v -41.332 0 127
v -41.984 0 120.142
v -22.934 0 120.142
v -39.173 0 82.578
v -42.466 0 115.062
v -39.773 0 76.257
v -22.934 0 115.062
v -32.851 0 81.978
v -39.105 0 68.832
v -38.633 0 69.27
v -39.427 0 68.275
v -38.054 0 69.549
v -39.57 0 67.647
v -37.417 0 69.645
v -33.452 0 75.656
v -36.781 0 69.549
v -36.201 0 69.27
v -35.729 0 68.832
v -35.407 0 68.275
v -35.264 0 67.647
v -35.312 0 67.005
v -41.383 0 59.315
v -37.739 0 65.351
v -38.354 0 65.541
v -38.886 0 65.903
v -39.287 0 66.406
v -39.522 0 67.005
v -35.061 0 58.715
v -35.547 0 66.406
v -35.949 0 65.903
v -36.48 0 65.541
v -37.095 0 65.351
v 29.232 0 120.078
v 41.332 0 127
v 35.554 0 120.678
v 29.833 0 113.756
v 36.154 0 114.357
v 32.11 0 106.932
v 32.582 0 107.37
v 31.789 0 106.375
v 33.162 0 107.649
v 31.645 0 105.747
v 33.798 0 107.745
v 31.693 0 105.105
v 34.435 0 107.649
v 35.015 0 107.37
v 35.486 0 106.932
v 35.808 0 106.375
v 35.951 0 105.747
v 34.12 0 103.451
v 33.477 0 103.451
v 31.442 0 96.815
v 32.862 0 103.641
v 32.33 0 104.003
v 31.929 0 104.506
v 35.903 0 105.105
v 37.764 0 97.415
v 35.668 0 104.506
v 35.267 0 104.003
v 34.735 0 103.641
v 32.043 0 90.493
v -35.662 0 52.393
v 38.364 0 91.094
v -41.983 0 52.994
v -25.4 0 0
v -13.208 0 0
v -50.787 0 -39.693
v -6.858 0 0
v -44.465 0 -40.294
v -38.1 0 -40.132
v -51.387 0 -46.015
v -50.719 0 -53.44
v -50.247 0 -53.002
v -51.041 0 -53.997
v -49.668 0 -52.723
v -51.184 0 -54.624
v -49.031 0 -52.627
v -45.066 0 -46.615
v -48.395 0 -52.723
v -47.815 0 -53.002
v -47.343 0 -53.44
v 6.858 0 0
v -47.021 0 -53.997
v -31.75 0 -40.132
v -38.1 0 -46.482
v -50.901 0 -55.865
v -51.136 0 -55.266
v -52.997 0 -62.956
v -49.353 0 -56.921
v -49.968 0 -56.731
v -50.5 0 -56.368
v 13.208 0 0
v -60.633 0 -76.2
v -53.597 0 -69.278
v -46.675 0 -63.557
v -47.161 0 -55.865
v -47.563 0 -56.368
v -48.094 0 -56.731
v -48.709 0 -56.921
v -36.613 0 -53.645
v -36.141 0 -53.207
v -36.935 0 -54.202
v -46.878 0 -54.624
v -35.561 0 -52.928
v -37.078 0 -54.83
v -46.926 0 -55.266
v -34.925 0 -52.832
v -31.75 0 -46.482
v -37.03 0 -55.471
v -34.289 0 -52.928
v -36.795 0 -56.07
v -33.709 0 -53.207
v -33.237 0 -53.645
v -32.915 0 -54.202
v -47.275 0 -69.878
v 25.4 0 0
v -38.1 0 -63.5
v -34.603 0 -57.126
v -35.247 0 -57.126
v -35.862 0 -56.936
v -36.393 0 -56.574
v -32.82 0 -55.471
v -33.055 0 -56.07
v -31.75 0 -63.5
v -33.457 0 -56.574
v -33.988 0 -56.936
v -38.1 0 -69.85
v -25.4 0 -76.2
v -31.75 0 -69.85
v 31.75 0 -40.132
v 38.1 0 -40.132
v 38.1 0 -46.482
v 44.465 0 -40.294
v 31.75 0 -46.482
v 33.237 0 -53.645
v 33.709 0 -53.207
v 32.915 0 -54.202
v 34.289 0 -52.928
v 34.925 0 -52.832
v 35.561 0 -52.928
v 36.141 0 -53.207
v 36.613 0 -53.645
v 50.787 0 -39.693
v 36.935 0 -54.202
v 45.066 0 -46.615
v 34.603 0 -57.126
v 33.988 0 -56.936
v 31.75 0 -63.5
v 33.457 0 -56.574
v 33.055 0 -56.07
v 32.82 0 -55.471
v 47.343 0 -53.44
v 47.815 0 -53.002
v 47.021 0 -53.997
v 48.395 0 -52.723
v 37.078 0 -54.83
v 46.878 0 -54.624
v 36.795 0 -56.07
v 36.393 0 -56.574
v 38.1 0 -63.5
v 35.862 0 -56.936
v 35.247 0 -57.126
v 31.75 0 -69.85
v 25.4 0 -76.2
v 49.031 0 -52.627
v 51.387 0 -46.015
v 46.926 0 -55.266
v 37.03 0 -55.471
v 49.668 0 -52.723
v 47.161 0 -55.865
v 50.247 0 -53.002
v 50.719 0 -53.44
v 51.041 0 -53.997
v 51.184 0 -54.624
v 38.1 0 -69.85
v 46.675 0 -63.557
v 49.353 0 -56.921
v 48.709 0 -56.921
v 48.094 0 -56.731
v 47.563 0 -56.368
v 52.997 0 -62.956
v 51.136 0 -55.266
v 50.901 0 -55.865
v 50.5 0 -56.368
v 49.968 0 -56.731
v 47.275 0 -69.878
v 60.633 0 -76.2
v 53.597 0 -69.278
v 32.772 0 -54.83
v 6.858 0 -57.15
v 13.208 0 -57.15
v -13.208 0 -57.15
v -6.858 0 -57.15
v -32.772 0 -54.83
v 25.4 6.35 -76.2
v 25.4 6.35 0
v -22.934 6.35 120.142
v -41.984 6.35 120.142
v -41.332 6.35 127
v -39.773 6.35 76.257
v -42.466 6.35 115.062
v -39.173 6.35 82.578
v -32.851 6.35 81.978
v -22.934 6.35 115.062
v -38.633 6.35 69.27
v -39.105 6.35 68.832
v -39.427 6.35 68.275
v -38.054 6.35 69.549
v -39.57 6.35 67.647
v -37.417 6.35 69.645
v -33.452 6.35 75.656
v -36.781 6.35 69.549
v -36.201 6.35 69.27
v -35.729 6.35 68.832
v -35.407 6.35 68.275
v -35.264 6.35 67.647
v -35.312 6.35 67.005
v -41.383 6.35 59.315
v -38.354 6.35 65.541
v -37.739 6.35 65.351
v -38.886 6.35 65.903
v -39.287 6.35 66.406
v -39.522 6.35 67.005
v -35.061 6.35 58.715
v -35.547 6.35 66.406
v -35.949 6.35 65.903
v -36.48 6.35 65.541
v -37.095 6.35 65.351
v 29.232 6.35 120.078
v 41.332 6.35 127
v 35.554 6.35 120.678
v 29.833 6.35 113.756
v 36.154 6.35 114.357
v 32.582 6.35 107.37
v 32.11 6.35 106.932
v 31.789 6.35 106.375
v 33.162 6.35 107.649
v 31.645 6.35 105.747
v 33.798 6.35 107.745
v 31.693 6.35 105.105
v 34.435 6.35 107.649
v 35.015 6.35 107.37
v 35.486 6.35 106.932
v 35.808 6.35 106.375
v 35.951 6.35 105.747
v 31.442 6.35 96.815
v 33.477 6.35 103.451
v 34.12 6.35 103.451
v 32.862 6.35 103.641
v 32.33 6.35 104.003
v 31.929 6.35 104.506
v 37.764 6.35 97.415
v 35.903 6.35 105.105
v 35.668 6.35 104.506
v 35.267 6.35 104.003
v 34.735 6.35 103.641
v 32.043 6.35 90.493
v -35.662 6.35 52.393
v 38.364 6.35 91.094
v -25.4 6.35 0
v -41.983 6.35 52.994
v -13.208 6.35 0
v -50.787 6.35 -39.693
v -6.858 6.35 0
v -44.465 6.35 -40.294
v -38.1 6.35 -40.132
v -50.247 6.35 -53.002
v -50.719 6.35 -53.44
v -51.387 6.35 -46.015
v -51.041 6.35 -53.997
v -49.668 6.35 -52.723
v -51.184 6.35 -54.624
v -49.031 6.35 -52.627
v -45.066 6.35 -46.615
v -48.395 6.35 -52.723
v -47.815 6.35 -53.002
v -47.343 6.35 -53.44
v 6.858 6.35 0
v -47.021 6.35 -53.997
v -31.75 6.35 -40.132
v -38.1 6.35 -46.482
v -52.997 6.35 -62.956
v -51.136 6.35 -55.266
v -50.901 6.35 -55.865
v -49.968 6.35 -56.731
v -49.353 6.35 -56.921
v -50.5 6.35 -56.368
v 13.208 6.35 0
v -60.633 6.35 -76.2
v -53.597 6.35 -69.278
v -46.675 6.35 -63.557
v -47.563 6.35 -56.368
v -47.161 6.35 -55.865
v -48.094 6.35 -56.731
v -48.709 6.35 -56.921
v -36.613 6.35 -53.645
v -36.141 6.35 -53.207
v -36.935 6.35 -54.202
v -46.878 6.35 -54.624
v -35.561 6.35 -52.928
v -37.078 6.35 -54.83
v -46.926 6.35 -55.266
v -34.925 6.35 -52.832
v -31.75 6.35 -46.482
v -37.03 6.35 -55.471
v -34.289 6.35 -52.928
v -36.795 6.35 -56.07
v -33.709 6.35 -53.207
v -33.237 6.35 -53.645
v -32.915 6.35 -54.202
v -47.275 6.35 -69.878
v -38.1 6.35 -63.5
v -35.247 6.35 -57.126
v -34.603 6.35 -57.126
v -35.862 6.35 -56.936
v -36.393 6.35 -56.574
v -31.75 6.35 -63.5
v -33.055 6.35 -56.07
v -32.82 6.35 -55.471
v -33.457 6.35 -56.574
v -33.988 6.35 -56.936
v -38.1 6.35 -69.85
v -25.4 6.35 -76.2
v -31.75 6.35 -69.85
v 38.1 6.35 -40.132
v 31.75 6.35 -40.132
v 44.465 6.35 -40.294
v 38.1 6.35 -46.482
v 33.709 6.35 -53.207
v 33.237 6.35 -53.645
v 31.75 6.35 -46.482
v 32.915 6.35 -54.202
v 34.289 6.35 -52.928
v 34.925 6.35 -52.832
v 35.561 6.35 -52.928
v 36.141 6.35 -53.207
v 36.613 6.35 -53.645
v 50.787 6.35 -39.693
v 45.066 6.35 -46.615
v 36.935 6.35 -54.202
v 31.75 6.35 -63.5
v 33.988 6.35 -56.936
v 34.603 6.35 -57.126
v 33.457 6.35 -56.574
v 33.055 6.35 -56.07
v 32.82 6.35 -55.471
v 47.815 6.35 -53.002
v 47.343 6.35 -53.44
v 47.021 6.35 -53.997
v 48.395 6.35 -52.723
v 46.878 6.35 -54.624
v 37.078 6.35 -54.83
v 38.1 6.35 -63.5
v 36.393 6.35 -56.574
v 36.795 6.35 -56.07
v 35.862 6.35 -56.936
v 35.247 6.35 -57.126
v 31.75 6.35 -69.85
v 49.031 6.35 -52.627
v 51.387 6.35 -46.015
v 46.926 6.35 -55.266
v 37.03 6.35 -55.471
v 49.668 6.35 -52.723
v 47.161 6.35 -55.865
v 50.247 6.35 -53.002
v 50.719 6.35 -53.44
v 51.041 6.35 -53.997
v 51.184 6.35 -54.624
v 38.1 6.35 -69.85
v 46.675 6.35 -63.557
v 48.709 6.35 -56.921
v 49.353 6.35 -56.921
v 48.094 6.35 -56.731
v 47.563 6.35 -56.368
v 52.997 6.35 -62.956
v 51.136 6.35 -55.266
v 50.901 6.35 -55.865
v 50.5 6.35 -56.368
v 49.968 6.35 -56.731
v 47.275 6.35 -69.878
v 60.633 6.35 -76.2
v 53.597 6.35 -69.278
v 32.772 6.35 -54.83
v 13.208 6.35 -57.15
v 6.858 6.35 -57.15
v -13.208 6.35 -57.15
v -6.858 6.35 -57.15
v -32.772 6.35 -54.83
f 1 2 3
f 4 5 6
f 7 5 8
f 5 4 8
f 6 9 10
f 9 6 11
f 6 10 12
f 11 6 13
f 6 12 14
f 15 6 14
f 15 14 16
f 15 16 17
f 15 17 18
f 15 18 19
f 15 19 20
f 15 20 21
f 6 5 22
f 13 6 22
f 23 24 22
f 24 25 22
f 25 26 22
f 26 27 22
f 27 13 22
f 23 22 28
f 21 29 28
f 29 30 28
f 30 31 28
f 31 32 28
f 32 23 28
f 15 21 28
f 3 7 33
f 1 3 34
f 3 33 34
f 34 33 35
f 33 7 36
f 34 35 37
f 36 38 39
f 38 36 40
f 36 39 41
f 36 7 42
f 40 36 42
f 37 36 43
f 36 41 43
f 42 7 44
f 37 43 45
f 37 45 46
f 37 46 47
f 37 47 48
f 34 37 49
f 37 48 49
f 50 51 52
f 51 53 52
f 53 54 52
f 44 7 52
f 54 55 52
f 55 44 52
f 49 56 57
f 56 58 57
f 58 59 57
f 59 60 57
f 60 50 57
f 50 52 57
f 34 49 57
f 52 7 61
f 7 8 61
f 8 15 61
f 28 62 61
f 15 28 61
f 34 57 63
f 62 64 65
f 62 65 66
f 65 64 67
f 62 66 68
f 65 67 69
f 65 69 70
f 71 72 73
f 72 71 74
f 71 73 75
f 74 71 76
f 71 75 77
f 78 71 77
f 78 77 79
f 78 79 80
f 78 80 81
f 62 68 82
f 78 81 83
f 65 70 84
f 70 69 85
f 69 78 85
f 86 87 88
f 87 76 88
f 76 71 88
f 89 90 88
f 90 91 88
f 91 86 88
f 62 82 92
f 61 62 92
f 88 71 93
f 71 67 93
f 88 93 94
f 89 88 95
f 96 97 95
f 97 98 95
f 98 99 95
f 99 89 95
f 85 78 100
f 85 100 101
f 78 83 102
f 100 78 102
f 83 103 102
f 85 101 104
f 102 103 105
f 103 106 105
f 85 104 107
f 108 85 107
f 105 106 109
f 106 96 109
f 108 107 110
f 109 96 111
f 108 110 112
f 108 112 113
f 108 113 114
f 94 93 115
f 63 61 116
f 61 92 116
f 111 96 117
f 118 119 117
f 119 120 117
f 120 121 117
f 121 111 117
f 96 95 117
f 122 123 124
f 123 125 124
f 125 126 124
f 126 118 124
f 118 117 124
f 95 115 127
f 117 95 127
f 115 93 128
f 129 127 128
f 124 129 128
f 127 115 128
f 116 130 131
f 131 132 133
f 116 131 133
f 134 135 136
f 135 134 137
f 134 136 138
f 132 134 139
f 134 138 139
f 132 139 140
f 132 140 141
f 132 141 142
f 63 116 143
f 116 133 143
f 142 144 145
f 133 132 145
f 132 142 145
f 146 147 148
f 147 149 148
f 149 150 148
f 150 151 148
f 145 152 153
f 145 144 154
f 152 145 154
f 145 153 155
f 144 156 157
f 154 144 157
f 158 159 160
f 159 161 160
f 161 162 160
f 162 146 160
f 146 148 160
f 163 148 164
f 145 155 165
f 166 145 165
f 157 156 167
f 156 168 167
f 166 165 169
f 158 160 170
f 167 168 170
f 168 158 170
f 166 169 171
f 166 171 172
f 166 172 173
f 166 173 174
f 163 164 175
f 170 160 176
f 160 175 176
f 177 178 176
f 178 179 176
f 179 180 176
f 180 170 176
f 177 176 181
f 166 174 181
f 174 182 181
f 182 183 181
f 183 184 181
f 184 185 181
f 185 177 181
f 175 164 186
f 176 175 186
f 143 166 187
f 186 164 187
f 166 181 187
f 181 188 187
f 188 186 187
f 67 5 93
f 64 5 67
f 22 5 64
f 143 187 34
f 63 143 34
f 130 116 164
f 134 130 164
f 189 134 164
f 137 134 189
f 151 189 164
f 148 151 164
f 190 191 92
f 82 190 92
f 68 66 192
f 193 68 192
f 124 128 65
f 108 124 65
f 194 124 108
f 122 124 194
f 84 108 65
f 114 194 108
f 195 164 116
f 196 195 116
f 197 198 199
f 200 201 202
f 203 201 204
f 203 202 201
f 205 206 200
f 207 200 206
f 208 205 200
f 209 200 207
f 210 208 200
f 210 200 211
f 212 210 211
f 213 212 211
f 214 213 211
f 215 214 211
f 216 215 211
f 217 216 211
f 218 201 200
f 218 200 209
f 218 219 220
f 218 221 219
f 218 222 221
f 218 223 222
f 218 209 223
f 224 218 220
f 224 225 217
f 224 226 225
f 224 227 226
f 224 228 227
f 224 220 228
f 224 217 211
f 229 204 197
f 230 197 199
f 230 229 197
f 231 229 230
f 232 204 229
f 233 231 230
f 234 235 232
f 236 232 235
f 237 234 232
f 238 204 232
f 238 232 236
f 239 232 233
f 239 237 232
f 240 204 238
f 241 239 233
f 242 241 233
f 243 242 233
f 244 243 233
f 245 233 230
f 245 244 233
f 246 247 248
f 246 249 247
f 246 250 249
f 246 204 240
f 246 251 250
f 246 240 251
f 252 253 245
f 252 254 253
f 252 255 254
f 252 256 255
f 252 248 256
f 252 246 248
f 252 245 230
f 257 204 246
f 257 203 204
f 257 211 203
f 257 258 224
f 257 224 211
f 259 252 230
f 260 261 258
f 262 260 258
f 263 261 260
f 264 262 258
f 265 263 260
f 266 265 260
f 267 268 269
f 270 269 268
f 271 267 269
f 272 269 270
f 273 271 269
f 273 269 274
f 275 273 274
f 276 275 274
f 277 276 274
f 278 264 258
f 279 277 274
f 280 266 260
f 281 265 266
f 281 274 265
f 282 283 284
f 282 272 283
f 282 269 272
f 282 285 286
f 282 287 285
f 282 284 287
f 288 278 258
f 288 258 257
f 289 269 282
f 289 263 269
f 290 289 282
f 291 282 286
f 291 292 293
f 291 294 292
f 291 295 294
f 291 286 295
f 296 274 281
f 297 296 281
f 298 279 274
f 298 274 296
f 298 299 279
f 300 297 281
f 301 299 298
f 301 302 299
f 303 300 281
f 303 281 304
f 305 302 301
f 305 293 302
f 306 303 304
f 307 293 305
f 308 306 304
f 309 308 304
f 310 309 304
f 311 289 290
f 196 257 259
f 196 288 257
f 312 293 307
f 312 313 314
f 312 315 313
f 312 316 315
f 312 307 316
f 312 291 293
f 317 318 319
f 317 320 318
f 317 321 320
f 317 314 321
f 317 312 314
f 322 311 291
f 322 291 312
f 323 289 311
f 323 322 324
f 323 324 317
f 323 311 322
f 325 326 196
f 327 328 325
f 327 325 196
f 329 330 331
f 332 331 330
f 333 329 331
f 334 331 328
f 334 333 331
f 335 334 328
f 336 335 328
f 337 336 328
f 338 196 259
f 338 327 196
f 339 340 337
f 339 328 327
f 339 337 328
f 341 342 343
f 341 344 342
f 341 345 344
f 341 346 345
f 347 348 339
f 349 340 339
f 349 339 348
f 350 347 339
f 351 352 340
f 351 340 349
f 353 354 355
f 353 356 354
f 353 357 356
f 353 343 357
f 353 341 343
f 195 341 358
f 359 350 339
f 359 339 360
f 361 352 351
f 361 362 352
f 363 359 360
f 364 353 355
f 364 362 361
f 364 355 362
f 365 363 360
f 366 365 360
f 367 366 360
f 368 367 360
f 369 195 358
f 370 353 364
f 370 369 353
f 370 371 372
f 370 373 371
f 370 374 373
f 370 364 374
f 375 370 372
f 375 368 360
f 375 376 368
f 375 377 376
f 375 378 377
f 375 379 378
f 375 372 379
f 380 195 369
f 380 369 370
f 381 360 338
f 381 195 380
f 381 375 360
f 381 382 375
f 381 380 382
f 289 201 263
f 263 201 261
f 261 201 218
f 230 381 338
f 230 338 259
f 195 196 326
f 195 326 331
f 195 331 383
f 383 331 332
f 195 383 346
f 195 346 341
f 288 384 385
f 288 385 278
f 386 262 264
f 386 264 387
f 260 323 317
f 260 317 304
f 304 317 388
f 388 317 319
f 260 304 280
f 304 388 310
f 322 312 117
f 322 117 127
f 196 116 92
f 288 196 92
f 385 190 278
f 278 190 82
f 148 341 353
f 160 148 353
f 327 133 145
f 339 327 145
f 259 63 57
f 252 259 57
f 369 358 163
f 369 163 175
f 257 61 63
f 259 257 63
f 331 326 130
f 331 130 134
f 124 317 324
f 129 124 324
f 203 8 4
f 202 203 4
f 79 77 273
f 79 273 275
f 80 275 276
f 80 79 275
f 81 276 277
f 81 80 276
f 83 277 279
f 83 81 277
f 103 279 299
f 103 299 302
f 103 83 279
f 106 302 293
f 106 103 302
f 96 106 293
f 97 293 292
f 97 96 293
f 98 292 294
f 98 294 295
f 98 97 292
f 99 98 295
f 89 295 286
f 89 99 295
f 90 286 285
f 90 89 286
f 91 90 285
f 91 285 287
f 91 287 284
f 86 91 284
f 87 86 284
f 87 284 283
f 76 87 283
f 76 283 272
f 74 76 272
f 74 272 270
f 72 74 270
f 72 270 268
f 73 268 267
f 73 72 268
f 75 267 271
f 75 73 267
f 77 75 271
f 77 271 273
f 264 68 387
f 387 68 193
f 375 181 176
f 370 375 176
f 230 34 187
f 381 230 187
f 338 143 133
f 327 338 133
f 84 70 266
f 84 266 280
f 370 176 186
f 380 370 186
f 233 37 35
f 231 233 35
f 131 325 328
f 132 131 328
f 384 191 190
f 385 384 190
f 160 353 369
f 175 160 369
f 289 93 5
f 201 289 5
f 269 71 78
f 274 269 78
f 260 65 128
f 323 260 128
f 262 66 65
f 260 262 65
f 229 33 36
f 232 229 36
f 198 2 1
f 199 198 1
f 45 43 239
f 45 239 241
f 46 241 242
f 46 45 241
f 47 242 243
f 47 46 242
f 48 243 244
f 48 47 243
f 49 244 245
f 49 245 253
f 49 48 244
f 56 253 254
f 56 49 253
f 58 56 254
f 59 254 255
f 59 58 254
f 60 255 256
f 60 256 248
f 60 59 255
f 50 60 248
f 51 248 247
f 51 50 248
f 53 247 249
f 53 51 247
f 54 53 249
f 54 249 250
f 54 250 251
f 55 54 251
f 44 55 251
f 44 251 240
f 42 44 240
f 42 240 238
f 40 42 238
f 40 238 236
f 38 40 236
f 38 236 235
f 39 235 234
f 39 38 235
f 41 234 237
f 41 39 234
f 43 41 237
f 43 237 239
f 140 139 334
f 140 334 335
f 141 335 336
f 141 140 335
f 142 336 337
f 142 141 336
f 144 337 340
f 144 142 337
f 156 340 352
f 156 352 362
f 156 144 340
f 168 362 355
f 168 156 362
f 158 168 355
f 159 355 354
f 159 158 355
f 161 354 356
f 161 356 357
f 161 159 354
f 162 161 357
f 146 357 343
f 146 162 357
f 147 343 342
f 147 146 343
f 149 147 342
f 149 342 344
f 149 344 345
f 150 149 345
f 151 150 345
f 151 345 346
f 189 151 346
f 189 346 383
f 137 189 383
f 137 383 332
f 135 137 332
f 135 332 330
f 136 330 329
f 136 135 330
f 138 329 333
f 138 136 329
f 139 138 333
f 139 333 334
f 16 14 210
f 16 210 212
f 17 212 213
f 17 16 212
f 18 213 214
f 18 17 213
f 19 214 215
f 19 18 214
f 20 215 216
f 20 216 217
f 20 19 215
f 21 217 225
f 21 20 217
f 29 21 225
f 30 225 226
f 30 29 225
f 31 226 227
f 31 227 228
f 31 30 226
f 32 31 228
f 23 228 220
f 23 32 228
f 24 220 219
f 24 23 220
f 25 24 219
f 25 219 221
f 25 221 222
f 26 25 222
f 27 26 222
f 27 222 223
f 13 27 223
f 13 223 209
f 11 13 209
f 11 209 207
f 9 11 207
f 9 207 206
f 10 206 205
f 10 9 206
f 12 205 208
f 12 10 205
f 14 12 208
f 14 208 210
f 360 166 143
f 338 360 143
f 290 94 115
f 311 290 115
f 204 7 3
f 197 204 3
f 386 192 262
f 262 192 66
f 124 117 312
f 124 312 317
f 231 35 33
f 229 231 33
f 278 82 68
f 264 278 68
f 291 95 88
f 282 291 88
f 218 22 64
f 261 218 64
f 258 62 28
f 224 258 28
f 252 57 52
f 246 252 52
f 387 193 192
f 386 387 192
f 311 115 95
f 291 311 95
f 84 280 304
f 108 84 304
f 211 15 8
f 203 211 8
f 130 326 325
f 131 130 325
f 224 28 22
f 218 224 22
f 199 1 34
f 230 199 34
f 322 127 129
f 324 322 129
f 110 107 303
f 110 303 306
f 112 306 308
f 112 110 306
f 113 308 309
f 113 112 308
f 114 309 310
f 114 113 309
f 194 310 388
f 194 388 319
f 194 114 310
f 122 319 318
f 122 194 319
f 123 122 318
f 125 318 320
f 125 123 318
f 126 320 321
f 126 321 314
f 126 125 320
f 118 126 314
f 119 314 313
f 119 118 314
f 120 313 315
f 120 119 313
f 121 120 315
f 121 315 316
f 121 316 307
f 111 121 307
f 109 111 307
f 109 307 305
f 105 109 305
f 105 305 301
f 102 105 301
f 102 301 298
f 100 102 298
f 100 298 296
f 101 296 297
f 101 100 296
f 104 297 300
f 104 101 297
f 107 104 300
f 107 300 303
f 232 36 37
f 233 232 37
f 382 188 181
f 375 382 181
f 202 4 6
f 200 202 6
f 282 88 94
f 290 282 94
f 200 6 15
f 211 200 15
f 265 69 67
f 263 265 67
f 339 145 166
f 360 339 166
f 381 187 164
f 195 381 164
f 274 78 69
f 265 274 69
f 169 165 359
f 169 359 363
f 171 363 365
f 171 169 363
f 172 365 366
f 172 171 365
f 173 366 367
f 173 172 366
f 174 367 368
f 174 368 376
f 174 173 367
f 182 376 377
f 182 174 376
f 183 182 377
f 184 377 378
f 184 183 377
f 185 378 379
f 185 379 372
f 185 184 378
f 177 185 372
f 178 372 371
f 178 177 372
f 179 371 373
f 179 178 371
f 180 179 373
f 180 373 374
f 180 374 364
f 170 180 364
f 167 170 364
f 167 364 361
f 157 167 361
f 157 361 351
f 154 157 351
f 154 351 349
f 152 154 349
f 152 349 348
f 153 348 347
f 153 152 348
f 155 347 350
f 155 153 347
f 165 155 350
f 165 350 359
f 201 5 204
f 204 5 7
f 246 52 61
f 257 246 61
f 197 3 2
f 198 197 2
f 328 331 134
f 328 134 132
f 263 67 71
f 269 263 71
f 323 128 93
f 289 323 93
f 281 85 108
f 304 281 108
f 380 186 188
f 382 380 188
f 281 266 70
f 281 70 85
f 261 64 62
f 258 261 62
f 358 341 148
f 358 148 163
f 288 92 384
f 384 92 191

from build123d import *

# Parameters (mm, degrees)
SKETCH1_R           = 2.159
SKETCH1_W           = 6.35
SKETCH1_H           = 6.35
BOSS_EXTRUDE1_DEPTH = 6.35


with BuildPart() as part:
    # Sketch1 → Boss-Extrude1 (new body)
    with BuildSketch(Plane(origin=(0, 0, 0), x_dir=(1, 0, 0), z_dir=(0, 1, 0))):
        Polygon((-25.4, 76.2), (-47.875911854, 76.2), (-60.633073629, 76.2), (-42.466090347, -115.062), (-22.93356755, -115.062), (-22.93356755, -120.142), (-41.98356755, -120.142), (-41.332161775, -127), (-28.575, -127), (0, -127), (28.575, -127), (41.332161775, -127), (60.633073629, 76.2), (47.875911854, 76.2), (25.4, 76.2), (25.4, 0), (13.208, 0), (13.208, 57.15), (6.858, 57.15), (6.858, 0), (-6.858, 0), (-6.858, 57.15), (-13.208, 57.15), (-13.208, 0), (-25.4, 0), align=None)
        Polygon((-39.17295277, -82.578452823), (-39.773403679, -76.256905647), (-33.451856503, -75.656454737), (-32.851405593, -81.978001914), align=None, mode=Mode.SUBTRACT)
        with Locations(Location((-37.41723431, -67.485806976, 0), (0, 0, 270))):
            Circle(SKETCH1_R, mode=Mode.SUBTRACT)
        Polygon((-35.66151585, -52.393161128), (-35.061064941, -58.714708304), (-41.382612117, -59.315159214), (-41.983063027, -52.993612037), align=None, mode=Mode.SUBTRACT)
        Polygon((29.83293553, -113.756454737), (36.154482707, -114.356905647), (35.554031797, -120.678452823), (29.232484621, -120.078001914), align=None, mode=Mode.SUBTRACT)
        with Locations(Location((33.798313337, -105.585806976, 0), (0, 0, 270))):
            Circle(SKETCH1_R, mode=Mode.SUBTRACT)
        Polygon((37.763691145, -97.415159214), (31.442143968, -96.814708304), (32.042594878, -90.493161128), (38.364142054, -91.093612037), align=None, mode=Mode.SUBTRACT)
        Polygon((-50.786897864, 39.693161128), (-51.387348774, 46.014708304), (-45.065801597, 46.615159214), (-44.465350687, 40.293612037), align=None, mode=Mode.SUBTRACT)
        with Locations((-34.925, 43.307)):
            Rectangle(SKETCH1_W, SKETCH1_H, mode=Mode.SUBTRACT)
        with Locations(Location((-49.031179404, 54.785806976, 0), (0, 0, 270))):
            Circle(SKETCH1_R, mode=Mode.SUBTRACT)
        Polygon((-47.275460944, 69.878452823), (-46.675010035, 63.556905647), (-52.996557211, 62.956454737), (-53.597008121, 69.278001914), align=None, mode=Mode.SUBTRACT)
        with Locations(Location((-34.925, 54.991, 0), (0, 0, 270))):
            Circle(SKETCH1_R, mode=Mode.SUBTRACT)
        with Locations((-34.925, 66.675)):
            Rectangle(SKETCH1_W, SKETCH1_H, mode=Mode.SUBTRACT)
        with Locations((34.925, 43.307)):
            Rectangle(SKETCH1_W, SKETCH1_H, mode=Mode.SUBTRACT)
        Polygon((45.065801597, 46.615159214), (51.387348774, 46.014708304), (50.786897864, 39.693161128), (44.465350687, 40.293612037), align=None, mode=Mode.SUBTRACT)
        with Locations(Location((34.925, 54.991, 0), (0, 0, 270))):
            Circle(SKETCH1_R, mode=Mode.SUBTRACT)
        with Locations((34.925, 66.675)):
            Rectangle(SKETCH1_W, SKETCH1_H, mode=Mode.SUBTRACT)
        with Locations(Location((49.031179404, 54.785806976, 0), (0, 0, 270))):
            Circle(SKETCH1_R, mode=Mode.SUBTRACT)
        Polygon((52.996557211, 62.956454737), (46.675010035, 63.556905647), (47.275460944, 69.878452823), (53.597008121, 69.278001914), align=None, mode=Mode.SUBTRACT)
    extrude(amount=BOSS_EXTRUDE1_DEPTH)


solid = part.part
